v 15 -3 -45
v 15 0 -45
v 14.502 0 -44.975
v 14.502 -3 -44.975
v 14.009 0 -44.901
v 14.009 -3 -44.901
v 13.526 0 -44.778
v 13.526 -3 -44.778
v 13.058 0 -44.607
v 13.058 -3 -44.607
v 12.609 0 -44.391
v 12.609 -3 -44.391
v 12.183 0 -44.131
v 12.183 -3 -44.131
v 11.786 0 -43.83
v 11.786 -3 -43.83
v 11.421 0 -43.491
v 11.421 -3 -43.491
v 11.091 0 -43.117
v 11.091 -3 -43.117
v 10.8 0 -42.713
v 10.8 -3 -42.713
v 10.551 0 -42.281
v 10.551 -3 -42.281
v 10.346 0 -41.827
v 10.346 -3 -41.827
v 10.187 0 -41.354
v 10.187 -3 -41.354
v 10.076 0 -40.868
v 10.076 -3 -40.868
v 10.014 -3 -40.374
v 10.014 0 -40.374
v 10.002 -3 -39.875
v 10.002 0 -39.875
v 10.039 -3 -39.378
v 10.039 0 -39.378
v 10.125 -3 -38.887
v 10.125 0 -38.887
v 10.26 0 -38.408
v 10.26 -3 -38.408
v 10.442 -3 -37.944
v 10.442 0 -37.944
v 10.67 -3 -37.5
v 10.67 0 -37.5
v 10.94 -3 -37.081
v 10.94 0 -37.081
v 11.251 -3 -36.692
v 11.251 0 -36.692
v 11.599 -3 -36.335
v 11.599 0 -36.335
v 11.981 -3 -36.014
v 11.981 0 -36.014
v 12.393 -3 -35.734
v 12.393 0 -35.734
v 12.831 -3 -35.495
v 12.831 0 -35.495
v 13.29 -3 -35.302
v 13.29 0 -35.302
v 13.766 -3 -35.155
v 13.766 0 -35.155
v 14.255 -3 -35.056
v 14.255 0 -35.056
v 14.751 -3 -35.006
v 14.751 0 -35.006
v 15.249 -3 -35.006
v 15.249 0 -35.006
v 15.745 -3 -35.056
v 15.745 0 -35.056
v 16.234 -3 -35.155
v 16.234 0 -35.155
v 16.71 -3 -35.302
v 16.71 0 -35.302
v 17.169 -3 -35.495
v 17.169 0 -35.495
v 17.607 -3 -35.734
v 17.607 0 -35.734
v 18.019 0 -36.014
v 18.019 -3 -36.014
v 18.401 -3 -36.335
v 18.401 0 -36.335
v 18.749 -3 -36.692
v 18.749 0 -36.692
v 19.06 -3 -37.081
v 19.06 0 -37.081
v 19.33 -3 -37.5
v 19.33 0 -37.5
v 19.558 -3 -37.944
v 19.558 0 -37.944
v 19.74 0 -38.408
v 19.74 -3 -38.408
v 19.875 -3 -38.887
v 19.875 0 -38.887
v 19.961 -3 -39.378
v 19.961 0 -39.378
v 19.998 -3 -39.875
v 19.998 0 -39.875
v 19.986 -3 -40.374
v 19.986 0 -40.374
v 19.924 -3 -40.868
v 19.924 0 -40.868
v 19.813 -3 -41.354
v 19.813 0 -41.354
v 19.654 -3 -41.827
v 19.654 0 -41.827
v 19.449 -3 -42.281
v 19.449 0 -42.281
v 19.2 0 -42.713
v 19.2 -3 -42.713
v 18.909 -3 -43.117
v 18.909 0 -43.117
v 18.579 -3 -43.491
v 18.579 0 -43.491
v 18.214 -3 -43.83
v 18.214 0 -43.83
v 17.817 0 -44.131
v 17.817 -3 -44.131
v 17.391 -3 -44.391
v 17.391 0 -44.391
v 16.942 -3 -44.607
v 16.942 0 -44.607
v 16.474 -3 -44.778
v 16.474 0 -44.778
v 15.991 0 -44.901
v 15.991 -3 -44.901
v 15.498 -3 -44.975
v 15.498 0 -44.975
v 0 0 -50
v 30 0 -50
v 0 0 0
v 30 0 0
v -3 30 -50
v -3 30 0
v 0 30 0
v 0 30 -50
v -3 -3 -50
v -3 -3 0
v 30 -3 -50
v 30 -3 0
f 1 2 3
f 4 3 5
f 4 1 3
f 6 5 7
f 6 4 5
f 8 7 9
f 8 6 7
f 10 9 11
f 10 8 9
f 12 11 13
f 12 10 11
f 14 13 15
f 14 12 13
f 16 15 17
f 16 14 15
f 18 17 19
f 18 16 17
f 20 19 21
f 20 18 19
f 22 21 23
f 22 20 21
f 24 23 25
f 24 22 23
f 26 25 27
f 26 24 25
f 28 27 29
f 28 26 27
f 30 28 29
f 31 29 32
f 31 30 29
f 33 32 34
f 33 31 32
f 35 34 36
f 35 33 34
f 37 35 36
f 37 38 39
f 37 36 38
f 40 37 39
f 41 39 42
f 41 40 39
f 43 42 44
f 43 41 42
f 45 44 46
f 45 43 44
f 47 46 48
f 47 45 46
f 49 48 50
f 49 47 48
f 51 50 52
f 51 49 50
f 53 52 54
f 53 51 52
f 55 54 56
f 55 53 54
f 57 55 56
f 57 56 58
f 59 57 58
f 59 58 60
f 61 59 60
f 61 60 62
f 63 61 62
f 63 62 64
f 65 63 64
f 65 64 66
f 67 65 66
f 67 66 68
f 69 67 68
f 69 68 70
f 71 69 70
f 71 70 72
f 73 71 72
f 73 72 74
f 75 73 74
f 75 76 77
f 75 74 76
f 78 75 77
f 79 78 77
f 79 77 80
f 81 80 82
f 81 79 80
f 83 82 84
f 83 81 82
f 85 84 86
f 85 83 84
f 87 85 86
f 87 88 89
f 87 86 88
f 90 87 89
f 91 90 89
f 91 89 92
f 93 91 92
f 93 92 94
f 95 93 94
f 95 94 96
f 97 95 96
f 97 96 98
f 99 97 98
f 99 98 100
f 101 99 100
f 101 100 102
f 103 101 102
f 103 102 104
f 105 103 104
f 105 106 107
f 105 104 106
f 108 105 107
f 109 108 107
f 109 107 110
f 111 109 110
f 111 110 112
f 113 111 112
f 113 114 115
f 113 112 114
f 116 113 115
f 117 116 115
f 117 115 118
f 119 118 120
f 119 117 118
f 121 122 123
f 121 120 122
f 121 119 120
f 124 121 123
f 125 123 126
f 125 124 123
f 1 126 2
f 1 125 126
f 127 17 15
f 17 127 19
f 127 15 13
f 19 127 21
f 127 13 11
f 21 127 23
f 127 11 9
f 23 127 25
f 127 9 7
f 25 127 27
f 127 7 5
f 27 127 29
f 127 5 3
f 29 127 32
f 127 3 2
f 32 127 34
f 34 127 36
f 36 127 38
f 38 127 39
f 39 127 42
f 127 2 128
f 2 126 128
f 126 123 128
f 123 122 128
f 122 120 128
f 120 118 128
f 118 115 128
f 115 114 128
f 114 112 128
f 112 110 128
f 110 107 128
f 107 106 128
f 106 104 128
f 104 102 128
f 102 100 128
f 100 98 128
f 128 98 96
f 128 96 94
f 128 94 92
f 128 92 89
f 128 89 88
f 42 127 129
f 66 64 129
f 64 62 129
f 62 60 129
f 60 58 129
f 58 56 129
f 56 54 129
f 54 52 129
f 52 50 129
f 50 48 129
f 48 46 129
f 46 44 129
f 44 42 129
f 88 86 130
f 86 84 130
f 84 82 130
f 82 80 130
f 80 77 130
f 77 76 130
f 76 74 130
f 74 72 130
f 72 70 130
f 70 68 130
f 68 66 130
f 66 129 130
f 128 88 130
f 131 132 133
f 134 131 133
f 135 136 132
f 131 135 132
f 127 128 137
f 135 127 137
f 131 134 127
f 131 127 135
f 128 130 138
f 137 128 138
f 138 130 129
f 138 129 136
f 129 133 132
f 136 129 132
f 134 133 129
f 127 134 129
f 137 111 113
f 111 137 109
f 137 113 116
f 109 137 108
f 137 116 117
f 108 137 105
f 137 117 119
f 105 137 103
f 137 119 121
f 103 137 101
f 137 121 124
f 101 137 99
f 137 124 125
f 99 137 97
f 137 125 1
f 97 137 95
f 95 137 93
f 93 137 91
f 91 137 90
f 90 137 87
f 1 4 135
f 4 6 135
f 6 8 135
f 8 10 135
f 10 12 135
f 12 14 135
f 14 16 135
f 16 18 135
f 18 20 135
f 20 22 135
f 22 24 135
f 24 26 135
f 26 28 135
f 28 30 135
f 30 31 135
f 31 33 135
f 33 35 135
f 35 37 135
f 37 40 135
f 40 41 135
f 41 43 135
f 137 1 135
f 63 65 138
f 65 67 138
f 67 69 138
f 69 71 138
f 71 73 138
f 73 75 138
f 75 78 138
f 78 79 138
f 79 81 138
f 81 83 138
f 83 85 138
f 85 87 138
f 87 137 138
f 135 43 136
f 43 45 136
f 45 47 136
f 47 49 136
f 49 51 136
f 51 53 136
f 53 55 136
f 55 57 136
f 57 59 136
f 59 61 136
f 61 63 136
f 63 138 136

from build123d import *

# Parameters (mm, degrees)
EXTRUDE_1_DEPTH     = 50
SKETCH_2_R          = 5
CUT_EXTRUDE_1_DEPTH = 10


with BuildPart() as part:
    # Эскиз1 → Вытянуть-Тонкостенный1 (new body)
    with BuildSketch(Plane.XY):
        Polygon((0, 30), (0, 0), (30, 0), (30, -3), (-3, -3), (-3, 30), align=None)
    extrude(amount=-EXTRUDE_1_DEPTH)

    # Эскиз2 → Вырез-Вытянуть1 (cut)
    with BuildSketch(Plane.ZX.offset(-3)):
        with Locations(Location((-40, 15, 0), (0, 0, 180))):
            Circle(SKETCH_2_R)
    extrude(amount=CUT_EXTRUDE_1_DEPTH, mode=Mode.SUBTRACT)


solid = part.part
